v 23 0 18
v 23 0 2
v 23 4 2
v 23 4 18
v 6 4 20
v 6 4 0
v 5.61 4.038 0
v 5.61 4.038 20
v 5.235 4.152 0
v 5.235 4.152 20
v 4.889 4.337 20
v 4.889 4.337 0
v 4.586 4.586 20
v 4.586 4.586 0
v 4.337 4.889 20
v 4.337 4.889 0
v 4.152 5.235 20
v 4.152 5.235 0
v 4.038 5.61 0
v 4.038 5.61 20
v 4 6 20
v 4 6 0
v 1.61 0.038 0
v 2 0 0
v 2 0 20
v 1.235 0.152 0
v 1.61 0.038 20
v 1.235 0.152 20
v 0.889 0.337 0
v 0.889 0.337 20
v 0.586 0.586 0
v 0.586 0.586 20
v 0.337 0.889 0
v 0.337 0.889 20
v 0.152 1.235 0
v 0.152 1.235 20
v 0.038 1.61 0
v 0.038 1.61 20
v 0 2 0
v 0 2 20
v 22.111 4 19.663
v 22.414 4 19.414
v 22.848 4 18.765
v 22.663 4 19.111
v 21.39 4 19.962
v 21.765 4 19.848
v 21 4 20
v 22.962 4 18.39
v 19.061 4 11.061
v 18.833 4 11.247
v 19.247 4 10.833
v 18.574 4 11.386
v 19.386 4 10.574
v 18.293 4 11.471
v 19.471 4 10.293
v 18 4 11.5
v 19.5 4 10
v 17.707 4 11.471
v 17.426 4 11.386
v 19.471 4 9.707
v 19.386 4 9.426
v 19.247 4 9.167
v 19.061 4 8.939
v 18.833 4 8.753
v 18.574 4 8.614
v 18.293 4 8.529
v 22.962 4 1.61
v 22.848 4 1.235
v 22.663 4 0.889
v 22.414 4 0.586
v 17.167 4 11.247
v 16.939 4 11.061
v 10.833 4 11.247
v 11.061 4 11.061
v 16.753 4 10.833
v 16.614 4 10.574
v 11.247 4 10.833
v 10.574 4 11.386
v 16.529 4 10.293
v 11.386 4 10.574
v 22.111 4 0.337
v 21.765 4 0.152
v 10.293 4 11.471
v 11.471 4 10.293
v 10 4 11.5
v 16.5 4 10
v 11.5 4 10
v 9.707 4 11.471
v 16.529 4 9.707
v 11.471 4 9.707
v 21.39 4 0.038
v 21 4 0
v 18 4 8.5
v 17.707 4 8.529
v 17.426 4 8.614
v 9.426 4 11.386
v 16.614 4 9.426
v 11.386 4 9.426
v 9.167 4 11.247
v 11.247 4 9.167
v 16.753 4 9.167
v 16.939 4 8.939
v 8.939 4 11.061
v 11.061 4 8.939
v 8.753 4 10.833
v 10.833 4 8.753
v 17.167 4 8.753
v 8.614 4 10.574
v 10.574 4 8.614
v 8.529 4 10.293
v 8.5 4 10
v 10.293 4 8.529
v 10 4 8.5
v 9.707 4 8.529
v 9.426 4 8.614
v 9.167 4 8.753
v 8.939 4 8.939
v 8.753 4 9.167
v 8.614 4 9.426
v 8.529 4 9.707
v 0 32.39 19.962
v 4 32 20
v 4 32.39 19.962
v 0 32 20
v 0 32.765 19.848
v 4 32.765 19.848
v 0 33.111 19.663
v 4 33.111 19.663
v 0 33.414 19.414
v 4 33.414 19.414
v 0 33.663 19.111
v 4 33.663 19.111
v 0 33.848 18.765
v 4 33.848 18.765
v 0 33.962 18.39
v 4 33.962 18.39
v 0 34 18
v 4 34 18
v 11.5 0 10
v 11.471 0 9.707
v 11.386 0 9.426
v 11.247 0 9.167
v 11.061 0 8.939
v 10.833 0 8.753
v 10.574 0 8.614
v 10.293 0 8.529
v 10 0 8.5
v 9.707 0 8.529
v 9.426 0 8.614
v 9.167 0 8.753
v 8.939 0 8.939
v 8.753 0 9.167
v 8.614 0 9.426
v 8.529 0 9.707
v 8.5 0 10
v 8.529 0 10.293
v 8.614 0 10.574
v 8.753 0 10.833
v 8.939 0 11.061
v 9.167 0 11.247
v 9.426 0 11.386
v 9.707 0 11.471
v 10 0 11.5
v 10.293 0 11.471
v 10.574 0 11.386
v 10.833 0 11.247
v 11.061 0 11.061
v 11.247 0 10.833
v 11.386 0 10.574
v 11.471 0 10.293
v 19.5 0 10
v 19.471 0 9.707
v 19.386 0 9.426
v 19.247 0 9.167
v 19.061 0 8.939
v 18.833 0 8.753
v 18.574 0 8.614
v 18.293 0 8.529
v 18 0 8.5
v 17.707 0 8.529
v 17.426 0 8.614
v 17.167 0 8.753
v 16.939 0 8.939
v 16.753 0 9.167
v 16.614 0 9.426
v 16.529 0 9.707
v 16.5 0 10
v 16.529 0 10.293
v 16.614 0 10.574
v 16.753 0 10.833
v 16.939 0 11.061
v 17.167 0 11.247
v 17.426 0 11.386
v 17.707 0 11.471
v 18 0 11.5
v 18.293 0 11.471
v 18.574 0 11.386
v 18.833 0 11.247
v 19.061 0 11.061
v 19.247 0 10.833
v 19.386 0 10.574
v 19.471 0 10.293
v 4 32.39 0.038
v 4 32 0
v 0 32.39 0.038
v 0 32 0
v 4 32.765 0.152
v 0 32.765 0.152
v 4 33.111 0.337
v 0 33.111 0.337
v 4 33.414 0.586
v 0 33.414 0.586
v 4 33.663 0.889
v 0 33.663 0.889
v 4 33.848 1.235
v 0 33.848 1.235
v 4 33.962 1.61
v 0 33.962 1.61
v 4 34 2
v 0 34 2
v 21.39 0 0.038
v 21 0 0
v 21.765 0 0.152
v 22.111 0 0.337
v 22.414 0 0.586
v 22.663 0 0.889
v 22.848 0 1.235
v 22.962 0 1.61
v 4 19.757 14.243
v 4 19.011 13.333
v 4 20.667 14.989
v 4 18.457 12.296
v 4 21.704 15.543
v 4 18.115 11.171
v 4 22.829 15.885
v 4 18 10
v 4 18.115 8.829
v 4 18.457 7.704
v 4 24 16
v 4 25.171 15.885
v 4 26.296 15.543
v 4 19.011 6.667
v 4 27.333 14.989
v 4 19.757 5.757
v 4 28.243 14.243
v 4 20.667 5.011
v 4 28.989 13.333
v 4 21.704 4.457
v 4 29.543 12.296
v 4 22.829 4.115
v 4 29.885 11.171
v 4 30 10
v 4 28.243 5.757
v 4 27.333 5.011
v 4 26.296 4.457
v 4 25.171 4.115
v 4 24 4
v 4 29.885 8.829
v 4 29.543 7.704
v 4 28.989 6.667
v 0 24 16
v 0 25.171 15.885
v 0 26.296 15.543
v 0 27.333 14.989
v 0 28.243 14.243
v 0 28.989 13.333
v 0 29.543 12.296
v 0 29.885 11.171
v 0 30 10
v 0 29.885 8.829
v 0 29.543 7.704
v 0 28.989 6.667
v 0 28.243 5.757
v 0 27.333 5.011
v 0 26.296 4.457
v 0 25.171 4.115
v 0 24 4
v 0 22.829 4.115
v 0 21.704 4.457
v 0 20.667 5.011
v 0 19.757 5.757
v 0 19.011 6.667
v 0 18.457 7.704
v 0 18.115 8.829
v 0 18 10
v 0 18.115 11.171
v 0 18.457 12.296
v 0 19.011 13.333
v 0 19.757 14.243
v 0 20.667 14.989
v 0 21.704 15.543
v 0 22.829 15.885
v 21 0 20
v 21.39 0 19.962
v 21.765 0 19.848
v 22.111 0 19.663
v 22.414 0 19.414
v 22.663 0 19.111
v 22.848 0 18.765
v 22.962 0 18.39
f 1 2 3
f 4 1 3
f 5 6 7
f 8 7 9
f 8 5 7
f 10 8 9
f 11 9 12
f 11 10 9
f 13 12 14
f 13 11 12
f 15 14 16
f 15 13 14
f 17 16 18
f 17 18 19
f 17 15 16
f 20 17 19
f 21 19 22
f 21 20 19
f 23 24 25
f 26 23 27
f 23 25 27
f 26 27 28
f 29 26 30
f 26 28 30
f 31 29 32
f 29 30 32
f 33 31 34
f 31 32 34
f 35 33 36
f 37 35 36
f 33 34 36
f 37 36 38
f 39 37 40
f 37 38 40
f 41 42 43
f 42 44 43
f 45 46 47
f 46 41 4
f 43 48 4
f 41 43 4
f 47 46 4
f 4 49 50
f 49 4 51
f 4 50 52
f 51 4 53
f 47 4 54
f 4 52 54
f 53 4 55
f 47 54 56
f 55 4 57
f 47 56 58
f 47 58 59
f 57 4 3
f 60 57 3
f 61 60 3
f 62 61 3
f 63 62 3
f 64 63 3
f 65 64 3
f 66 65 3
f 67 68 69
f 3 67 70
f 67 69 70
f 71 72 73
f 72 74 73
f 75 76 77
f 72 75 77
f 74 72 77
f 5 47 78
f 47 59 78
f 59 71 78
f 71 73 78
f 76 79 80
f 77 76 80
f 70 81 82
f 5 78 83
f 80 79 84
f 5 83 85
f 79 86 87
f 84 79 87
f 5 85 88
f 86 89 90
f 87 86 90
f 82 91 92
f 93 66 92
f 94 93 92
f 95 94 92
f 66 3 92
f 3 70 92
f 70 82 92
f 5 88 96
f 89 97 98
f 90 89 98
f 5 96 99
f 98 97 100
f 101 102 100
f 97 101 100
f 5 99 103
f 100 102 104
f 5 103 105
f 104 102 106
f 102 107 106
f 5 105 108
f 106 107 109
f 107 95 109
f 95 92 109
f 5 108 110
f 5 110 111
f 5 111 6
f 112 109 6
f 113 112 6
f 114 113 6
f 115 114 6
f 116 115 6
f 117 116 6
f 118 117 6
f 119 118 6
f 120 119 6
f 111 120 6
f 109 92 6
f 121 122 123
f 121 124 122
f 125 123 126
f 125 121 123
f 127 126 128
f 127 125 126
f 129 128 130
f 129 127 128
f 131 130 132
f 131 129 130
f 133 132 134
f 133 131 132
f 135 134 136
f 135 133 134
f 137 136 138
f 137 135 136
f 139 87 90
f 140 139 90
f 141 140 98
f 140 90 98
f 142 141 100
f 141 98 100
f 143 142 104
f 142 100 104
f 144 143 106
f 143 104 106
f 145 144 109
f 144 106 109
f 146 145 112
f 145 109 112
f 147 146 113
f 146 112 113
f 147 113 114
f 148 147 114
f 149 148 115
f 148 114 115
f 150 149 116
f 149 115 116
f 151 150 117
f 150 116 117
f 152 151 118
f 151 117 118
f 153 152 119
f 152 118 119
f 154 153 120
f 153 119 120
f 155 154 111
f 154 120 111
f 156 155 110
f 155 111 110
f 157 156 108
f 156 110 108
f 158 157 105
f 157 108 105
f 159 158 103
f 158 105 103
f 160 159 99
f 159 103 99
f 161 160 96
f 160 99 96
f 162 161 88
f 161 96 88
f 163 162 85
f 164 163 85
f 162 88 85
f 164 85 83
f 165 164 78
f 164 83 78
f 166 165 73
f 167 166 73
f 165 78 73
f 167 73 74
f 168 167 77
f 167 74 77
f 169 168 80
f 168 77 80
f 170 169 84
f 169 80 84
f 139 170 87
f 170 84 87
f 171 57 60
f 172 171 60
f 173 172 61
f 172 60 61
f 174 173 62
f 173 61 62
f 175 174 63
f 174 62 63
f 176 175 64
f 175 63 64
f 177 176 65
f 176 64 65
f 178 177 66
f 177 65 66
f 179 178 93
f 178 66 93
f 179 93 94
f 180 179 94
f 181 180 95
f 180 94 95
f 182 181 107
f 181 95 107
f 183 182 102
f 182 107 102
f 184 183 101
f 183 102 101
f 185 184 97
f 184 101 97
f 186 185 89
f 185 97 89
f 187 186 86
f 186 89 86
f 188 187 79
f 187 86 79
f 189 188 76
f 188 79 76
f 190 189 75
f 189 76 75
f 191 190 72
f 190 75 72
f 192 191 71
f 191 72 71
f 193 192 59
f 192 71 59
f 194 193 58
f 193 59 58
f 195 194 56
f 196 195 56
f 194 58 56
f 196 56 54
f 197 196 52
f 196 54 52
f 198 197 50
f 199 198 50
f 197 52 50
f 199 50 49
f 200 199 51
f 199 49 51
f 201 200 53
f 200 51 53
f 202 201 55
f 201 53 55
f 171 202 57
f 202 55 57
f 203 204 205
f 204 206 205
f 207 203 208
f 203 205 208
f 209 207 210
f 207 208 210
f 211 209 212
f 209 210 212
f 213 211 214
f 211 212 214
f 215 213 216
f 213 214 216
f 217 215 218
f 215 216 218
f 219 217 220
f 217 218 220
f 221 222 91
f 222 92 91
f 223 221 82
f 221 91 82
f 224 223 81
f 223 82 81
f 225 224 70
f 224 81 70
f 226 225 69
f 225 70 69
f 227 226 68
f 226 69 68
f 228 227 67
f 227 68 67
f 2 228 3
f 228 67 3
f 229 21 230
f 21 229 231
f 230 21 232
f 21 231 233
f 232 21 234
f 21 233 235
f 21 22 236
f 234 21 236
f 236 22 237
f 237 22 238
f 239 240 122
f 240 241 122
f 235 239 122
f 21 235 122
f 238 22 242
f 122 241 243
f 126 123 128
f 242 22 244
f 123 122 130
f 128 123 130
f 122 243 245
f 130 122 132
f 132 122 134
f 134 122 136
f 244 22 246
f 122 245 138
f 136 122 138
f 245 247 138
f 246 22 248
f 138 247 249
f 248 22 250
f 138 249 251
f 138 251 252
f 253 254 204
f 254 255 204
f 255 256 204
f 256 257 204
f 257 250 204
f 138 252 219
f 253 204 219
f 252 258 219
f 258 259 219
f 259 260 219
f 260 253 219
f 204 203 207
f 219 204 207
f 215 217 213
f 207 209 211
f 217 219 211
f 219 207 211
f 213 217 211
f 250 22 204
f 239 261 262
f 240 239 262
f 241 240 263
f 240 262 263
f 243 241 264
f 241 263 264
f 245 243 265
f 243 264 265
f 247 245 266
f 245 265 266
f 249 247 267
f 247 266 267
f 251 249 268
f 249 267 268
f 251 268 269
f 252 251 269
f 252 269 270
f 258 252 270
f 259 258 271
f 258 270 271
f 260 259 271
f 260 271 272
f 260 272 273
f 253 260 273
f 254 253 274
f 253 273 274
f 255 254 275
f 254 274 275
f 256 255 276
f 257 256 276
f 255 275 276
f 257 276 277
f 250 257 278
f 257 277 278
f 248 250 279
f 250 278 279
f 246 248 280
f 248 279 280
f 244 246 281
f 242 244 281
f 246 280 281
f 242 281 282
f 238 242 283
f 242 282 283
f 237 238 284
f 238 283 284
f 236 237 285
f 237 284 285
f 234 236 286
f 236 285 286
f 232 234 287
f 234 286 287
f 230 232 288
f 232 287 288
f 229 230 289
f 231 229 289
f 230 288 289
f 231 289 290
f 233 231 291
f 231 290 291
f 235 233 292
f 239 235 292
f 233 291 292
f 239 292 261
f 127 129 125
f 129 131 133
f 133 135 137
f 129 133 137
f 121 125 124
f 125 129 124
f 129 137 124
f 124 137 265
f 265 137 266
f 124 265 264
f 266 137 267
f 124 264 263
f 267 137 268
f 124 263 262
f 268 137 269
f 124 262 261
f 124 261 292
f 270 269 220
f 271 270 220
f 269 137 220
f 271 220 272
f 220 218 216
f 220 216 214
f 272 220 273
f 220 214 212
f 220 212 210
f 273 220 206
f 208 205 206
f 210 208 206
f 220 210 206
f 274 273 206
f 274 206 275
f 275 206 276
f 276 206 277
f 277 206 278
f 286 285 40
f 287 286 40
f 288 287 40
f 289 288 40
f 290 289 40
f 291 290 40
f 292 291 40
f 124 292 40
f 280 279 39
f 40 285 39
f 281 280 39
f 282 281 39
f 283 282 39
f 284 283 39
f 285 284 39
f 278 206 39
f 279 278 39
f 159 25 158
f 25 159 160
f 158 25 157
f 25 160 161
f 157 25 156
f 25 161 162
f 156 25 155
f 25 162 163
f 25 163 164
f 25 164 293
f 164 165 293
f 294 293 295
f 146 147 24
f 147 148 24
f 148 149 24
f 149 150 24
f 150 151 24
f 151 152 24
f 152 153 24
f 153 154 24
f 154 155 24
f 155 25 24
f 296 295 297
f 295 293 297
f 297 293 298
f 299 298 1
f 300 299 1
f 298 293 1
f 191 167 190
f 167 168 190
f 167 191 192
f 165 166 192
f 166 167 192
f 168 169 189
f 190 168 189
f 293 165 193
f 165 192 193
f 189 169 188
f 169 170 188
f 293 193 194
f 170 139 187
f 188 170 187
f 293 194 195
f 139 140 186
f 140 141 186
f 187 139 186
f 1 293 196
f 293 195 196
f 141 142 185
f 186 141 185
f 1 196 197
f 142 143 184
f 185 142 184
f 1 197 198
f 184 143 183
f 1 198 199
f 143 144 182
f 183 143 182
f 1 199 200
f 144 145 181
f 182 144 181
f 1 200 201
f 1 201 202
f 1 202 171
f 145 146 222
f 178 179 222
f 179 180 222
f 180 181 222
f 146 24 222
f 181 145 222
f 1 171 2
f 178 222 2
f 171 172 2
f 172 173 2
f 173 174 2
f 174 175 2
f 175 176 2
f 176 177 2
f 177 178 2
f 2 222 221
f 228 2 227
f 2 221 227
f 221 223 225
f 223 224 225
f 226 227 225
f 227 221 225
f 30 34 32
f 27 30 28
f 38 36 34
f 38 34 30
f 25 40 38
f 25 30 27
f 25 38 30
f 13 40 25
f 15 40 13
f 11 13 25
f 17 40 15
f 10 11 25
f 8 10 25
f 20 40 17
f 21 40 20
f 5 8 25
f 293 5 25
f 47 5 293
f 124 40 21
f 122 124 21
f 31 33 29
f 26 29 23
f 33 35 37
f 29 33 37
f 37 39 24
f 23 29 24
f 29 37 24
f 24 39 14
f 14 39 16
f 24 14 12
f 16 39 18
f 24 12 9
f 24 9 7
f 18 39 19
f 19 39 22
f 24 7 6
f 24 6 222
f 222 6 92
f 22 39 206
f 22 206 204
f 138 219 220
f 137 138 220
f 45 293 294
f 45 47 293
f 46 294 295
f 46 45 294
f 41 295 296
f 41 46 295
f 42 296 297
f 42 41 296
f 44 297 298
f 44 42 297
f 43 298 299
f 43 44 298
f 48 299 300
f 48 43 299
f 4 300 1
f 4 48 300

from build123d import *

# Parameters (mm, degrees)
BOSS_EXTRUDE1_DEPTH = 20
SKETCH2_R           = 6
CUT_EXTRUDE1_DEPTH  = 4
SKETCH3_R           = 1.5
CUT_EXTRUDE2_DEPTH  = 4
FILLET1_R           = 2


with BuildPart() as part:
    # Sketch1 → Boss-Extrude1 (new body)
    with BuildSketch(Plane.XY):
        Polygon((0, 0), (23, 0), (23, 4), (4, 4), (4, 34), (0, 34), align=None)
    extrude(amount=BOSS_EXTRUDE1_DEPTH)

    # Sketch2 → Cut-Extrude1 (cut)
    with BuildSketch(Plane.ZY):
        with Locations((10, 24)):
            Circle(SKETCH2_R)
    extrude(amount=-CUT_EXTRUDE1_DEPTH, mode=Mode.SUBTRACT)

    # Sketch3 → Cut-Extrude2 (cut)
    with BuildSketch(Plane(origin=(0, 4, 0), x_dir=(1, 0, 0), z_dir=(0, 1, 0))):
        with Locations((18, -10)):
            Circle(SKETCH3_R)
        with Locations((10, -10)):
            Circle(SKETCH3_R)
    extrude(amount=-CUT_EXTRUDE2_DEPTH, mode=Mode.SUBTRACT)

    # Fillet1
    fillet1_edges = [part.edges().sort_by_distance(p)[0] for p in [
        (23, 2, 20),
        (4, 4, 10),
        (0, 0, 10),
        (2, 34, 20),
        (2, 34, 0),
        (23, 2, 0),
    ]]
    fillet(fillet1_edges, radius=FILLET1_R)


solid = part.part
